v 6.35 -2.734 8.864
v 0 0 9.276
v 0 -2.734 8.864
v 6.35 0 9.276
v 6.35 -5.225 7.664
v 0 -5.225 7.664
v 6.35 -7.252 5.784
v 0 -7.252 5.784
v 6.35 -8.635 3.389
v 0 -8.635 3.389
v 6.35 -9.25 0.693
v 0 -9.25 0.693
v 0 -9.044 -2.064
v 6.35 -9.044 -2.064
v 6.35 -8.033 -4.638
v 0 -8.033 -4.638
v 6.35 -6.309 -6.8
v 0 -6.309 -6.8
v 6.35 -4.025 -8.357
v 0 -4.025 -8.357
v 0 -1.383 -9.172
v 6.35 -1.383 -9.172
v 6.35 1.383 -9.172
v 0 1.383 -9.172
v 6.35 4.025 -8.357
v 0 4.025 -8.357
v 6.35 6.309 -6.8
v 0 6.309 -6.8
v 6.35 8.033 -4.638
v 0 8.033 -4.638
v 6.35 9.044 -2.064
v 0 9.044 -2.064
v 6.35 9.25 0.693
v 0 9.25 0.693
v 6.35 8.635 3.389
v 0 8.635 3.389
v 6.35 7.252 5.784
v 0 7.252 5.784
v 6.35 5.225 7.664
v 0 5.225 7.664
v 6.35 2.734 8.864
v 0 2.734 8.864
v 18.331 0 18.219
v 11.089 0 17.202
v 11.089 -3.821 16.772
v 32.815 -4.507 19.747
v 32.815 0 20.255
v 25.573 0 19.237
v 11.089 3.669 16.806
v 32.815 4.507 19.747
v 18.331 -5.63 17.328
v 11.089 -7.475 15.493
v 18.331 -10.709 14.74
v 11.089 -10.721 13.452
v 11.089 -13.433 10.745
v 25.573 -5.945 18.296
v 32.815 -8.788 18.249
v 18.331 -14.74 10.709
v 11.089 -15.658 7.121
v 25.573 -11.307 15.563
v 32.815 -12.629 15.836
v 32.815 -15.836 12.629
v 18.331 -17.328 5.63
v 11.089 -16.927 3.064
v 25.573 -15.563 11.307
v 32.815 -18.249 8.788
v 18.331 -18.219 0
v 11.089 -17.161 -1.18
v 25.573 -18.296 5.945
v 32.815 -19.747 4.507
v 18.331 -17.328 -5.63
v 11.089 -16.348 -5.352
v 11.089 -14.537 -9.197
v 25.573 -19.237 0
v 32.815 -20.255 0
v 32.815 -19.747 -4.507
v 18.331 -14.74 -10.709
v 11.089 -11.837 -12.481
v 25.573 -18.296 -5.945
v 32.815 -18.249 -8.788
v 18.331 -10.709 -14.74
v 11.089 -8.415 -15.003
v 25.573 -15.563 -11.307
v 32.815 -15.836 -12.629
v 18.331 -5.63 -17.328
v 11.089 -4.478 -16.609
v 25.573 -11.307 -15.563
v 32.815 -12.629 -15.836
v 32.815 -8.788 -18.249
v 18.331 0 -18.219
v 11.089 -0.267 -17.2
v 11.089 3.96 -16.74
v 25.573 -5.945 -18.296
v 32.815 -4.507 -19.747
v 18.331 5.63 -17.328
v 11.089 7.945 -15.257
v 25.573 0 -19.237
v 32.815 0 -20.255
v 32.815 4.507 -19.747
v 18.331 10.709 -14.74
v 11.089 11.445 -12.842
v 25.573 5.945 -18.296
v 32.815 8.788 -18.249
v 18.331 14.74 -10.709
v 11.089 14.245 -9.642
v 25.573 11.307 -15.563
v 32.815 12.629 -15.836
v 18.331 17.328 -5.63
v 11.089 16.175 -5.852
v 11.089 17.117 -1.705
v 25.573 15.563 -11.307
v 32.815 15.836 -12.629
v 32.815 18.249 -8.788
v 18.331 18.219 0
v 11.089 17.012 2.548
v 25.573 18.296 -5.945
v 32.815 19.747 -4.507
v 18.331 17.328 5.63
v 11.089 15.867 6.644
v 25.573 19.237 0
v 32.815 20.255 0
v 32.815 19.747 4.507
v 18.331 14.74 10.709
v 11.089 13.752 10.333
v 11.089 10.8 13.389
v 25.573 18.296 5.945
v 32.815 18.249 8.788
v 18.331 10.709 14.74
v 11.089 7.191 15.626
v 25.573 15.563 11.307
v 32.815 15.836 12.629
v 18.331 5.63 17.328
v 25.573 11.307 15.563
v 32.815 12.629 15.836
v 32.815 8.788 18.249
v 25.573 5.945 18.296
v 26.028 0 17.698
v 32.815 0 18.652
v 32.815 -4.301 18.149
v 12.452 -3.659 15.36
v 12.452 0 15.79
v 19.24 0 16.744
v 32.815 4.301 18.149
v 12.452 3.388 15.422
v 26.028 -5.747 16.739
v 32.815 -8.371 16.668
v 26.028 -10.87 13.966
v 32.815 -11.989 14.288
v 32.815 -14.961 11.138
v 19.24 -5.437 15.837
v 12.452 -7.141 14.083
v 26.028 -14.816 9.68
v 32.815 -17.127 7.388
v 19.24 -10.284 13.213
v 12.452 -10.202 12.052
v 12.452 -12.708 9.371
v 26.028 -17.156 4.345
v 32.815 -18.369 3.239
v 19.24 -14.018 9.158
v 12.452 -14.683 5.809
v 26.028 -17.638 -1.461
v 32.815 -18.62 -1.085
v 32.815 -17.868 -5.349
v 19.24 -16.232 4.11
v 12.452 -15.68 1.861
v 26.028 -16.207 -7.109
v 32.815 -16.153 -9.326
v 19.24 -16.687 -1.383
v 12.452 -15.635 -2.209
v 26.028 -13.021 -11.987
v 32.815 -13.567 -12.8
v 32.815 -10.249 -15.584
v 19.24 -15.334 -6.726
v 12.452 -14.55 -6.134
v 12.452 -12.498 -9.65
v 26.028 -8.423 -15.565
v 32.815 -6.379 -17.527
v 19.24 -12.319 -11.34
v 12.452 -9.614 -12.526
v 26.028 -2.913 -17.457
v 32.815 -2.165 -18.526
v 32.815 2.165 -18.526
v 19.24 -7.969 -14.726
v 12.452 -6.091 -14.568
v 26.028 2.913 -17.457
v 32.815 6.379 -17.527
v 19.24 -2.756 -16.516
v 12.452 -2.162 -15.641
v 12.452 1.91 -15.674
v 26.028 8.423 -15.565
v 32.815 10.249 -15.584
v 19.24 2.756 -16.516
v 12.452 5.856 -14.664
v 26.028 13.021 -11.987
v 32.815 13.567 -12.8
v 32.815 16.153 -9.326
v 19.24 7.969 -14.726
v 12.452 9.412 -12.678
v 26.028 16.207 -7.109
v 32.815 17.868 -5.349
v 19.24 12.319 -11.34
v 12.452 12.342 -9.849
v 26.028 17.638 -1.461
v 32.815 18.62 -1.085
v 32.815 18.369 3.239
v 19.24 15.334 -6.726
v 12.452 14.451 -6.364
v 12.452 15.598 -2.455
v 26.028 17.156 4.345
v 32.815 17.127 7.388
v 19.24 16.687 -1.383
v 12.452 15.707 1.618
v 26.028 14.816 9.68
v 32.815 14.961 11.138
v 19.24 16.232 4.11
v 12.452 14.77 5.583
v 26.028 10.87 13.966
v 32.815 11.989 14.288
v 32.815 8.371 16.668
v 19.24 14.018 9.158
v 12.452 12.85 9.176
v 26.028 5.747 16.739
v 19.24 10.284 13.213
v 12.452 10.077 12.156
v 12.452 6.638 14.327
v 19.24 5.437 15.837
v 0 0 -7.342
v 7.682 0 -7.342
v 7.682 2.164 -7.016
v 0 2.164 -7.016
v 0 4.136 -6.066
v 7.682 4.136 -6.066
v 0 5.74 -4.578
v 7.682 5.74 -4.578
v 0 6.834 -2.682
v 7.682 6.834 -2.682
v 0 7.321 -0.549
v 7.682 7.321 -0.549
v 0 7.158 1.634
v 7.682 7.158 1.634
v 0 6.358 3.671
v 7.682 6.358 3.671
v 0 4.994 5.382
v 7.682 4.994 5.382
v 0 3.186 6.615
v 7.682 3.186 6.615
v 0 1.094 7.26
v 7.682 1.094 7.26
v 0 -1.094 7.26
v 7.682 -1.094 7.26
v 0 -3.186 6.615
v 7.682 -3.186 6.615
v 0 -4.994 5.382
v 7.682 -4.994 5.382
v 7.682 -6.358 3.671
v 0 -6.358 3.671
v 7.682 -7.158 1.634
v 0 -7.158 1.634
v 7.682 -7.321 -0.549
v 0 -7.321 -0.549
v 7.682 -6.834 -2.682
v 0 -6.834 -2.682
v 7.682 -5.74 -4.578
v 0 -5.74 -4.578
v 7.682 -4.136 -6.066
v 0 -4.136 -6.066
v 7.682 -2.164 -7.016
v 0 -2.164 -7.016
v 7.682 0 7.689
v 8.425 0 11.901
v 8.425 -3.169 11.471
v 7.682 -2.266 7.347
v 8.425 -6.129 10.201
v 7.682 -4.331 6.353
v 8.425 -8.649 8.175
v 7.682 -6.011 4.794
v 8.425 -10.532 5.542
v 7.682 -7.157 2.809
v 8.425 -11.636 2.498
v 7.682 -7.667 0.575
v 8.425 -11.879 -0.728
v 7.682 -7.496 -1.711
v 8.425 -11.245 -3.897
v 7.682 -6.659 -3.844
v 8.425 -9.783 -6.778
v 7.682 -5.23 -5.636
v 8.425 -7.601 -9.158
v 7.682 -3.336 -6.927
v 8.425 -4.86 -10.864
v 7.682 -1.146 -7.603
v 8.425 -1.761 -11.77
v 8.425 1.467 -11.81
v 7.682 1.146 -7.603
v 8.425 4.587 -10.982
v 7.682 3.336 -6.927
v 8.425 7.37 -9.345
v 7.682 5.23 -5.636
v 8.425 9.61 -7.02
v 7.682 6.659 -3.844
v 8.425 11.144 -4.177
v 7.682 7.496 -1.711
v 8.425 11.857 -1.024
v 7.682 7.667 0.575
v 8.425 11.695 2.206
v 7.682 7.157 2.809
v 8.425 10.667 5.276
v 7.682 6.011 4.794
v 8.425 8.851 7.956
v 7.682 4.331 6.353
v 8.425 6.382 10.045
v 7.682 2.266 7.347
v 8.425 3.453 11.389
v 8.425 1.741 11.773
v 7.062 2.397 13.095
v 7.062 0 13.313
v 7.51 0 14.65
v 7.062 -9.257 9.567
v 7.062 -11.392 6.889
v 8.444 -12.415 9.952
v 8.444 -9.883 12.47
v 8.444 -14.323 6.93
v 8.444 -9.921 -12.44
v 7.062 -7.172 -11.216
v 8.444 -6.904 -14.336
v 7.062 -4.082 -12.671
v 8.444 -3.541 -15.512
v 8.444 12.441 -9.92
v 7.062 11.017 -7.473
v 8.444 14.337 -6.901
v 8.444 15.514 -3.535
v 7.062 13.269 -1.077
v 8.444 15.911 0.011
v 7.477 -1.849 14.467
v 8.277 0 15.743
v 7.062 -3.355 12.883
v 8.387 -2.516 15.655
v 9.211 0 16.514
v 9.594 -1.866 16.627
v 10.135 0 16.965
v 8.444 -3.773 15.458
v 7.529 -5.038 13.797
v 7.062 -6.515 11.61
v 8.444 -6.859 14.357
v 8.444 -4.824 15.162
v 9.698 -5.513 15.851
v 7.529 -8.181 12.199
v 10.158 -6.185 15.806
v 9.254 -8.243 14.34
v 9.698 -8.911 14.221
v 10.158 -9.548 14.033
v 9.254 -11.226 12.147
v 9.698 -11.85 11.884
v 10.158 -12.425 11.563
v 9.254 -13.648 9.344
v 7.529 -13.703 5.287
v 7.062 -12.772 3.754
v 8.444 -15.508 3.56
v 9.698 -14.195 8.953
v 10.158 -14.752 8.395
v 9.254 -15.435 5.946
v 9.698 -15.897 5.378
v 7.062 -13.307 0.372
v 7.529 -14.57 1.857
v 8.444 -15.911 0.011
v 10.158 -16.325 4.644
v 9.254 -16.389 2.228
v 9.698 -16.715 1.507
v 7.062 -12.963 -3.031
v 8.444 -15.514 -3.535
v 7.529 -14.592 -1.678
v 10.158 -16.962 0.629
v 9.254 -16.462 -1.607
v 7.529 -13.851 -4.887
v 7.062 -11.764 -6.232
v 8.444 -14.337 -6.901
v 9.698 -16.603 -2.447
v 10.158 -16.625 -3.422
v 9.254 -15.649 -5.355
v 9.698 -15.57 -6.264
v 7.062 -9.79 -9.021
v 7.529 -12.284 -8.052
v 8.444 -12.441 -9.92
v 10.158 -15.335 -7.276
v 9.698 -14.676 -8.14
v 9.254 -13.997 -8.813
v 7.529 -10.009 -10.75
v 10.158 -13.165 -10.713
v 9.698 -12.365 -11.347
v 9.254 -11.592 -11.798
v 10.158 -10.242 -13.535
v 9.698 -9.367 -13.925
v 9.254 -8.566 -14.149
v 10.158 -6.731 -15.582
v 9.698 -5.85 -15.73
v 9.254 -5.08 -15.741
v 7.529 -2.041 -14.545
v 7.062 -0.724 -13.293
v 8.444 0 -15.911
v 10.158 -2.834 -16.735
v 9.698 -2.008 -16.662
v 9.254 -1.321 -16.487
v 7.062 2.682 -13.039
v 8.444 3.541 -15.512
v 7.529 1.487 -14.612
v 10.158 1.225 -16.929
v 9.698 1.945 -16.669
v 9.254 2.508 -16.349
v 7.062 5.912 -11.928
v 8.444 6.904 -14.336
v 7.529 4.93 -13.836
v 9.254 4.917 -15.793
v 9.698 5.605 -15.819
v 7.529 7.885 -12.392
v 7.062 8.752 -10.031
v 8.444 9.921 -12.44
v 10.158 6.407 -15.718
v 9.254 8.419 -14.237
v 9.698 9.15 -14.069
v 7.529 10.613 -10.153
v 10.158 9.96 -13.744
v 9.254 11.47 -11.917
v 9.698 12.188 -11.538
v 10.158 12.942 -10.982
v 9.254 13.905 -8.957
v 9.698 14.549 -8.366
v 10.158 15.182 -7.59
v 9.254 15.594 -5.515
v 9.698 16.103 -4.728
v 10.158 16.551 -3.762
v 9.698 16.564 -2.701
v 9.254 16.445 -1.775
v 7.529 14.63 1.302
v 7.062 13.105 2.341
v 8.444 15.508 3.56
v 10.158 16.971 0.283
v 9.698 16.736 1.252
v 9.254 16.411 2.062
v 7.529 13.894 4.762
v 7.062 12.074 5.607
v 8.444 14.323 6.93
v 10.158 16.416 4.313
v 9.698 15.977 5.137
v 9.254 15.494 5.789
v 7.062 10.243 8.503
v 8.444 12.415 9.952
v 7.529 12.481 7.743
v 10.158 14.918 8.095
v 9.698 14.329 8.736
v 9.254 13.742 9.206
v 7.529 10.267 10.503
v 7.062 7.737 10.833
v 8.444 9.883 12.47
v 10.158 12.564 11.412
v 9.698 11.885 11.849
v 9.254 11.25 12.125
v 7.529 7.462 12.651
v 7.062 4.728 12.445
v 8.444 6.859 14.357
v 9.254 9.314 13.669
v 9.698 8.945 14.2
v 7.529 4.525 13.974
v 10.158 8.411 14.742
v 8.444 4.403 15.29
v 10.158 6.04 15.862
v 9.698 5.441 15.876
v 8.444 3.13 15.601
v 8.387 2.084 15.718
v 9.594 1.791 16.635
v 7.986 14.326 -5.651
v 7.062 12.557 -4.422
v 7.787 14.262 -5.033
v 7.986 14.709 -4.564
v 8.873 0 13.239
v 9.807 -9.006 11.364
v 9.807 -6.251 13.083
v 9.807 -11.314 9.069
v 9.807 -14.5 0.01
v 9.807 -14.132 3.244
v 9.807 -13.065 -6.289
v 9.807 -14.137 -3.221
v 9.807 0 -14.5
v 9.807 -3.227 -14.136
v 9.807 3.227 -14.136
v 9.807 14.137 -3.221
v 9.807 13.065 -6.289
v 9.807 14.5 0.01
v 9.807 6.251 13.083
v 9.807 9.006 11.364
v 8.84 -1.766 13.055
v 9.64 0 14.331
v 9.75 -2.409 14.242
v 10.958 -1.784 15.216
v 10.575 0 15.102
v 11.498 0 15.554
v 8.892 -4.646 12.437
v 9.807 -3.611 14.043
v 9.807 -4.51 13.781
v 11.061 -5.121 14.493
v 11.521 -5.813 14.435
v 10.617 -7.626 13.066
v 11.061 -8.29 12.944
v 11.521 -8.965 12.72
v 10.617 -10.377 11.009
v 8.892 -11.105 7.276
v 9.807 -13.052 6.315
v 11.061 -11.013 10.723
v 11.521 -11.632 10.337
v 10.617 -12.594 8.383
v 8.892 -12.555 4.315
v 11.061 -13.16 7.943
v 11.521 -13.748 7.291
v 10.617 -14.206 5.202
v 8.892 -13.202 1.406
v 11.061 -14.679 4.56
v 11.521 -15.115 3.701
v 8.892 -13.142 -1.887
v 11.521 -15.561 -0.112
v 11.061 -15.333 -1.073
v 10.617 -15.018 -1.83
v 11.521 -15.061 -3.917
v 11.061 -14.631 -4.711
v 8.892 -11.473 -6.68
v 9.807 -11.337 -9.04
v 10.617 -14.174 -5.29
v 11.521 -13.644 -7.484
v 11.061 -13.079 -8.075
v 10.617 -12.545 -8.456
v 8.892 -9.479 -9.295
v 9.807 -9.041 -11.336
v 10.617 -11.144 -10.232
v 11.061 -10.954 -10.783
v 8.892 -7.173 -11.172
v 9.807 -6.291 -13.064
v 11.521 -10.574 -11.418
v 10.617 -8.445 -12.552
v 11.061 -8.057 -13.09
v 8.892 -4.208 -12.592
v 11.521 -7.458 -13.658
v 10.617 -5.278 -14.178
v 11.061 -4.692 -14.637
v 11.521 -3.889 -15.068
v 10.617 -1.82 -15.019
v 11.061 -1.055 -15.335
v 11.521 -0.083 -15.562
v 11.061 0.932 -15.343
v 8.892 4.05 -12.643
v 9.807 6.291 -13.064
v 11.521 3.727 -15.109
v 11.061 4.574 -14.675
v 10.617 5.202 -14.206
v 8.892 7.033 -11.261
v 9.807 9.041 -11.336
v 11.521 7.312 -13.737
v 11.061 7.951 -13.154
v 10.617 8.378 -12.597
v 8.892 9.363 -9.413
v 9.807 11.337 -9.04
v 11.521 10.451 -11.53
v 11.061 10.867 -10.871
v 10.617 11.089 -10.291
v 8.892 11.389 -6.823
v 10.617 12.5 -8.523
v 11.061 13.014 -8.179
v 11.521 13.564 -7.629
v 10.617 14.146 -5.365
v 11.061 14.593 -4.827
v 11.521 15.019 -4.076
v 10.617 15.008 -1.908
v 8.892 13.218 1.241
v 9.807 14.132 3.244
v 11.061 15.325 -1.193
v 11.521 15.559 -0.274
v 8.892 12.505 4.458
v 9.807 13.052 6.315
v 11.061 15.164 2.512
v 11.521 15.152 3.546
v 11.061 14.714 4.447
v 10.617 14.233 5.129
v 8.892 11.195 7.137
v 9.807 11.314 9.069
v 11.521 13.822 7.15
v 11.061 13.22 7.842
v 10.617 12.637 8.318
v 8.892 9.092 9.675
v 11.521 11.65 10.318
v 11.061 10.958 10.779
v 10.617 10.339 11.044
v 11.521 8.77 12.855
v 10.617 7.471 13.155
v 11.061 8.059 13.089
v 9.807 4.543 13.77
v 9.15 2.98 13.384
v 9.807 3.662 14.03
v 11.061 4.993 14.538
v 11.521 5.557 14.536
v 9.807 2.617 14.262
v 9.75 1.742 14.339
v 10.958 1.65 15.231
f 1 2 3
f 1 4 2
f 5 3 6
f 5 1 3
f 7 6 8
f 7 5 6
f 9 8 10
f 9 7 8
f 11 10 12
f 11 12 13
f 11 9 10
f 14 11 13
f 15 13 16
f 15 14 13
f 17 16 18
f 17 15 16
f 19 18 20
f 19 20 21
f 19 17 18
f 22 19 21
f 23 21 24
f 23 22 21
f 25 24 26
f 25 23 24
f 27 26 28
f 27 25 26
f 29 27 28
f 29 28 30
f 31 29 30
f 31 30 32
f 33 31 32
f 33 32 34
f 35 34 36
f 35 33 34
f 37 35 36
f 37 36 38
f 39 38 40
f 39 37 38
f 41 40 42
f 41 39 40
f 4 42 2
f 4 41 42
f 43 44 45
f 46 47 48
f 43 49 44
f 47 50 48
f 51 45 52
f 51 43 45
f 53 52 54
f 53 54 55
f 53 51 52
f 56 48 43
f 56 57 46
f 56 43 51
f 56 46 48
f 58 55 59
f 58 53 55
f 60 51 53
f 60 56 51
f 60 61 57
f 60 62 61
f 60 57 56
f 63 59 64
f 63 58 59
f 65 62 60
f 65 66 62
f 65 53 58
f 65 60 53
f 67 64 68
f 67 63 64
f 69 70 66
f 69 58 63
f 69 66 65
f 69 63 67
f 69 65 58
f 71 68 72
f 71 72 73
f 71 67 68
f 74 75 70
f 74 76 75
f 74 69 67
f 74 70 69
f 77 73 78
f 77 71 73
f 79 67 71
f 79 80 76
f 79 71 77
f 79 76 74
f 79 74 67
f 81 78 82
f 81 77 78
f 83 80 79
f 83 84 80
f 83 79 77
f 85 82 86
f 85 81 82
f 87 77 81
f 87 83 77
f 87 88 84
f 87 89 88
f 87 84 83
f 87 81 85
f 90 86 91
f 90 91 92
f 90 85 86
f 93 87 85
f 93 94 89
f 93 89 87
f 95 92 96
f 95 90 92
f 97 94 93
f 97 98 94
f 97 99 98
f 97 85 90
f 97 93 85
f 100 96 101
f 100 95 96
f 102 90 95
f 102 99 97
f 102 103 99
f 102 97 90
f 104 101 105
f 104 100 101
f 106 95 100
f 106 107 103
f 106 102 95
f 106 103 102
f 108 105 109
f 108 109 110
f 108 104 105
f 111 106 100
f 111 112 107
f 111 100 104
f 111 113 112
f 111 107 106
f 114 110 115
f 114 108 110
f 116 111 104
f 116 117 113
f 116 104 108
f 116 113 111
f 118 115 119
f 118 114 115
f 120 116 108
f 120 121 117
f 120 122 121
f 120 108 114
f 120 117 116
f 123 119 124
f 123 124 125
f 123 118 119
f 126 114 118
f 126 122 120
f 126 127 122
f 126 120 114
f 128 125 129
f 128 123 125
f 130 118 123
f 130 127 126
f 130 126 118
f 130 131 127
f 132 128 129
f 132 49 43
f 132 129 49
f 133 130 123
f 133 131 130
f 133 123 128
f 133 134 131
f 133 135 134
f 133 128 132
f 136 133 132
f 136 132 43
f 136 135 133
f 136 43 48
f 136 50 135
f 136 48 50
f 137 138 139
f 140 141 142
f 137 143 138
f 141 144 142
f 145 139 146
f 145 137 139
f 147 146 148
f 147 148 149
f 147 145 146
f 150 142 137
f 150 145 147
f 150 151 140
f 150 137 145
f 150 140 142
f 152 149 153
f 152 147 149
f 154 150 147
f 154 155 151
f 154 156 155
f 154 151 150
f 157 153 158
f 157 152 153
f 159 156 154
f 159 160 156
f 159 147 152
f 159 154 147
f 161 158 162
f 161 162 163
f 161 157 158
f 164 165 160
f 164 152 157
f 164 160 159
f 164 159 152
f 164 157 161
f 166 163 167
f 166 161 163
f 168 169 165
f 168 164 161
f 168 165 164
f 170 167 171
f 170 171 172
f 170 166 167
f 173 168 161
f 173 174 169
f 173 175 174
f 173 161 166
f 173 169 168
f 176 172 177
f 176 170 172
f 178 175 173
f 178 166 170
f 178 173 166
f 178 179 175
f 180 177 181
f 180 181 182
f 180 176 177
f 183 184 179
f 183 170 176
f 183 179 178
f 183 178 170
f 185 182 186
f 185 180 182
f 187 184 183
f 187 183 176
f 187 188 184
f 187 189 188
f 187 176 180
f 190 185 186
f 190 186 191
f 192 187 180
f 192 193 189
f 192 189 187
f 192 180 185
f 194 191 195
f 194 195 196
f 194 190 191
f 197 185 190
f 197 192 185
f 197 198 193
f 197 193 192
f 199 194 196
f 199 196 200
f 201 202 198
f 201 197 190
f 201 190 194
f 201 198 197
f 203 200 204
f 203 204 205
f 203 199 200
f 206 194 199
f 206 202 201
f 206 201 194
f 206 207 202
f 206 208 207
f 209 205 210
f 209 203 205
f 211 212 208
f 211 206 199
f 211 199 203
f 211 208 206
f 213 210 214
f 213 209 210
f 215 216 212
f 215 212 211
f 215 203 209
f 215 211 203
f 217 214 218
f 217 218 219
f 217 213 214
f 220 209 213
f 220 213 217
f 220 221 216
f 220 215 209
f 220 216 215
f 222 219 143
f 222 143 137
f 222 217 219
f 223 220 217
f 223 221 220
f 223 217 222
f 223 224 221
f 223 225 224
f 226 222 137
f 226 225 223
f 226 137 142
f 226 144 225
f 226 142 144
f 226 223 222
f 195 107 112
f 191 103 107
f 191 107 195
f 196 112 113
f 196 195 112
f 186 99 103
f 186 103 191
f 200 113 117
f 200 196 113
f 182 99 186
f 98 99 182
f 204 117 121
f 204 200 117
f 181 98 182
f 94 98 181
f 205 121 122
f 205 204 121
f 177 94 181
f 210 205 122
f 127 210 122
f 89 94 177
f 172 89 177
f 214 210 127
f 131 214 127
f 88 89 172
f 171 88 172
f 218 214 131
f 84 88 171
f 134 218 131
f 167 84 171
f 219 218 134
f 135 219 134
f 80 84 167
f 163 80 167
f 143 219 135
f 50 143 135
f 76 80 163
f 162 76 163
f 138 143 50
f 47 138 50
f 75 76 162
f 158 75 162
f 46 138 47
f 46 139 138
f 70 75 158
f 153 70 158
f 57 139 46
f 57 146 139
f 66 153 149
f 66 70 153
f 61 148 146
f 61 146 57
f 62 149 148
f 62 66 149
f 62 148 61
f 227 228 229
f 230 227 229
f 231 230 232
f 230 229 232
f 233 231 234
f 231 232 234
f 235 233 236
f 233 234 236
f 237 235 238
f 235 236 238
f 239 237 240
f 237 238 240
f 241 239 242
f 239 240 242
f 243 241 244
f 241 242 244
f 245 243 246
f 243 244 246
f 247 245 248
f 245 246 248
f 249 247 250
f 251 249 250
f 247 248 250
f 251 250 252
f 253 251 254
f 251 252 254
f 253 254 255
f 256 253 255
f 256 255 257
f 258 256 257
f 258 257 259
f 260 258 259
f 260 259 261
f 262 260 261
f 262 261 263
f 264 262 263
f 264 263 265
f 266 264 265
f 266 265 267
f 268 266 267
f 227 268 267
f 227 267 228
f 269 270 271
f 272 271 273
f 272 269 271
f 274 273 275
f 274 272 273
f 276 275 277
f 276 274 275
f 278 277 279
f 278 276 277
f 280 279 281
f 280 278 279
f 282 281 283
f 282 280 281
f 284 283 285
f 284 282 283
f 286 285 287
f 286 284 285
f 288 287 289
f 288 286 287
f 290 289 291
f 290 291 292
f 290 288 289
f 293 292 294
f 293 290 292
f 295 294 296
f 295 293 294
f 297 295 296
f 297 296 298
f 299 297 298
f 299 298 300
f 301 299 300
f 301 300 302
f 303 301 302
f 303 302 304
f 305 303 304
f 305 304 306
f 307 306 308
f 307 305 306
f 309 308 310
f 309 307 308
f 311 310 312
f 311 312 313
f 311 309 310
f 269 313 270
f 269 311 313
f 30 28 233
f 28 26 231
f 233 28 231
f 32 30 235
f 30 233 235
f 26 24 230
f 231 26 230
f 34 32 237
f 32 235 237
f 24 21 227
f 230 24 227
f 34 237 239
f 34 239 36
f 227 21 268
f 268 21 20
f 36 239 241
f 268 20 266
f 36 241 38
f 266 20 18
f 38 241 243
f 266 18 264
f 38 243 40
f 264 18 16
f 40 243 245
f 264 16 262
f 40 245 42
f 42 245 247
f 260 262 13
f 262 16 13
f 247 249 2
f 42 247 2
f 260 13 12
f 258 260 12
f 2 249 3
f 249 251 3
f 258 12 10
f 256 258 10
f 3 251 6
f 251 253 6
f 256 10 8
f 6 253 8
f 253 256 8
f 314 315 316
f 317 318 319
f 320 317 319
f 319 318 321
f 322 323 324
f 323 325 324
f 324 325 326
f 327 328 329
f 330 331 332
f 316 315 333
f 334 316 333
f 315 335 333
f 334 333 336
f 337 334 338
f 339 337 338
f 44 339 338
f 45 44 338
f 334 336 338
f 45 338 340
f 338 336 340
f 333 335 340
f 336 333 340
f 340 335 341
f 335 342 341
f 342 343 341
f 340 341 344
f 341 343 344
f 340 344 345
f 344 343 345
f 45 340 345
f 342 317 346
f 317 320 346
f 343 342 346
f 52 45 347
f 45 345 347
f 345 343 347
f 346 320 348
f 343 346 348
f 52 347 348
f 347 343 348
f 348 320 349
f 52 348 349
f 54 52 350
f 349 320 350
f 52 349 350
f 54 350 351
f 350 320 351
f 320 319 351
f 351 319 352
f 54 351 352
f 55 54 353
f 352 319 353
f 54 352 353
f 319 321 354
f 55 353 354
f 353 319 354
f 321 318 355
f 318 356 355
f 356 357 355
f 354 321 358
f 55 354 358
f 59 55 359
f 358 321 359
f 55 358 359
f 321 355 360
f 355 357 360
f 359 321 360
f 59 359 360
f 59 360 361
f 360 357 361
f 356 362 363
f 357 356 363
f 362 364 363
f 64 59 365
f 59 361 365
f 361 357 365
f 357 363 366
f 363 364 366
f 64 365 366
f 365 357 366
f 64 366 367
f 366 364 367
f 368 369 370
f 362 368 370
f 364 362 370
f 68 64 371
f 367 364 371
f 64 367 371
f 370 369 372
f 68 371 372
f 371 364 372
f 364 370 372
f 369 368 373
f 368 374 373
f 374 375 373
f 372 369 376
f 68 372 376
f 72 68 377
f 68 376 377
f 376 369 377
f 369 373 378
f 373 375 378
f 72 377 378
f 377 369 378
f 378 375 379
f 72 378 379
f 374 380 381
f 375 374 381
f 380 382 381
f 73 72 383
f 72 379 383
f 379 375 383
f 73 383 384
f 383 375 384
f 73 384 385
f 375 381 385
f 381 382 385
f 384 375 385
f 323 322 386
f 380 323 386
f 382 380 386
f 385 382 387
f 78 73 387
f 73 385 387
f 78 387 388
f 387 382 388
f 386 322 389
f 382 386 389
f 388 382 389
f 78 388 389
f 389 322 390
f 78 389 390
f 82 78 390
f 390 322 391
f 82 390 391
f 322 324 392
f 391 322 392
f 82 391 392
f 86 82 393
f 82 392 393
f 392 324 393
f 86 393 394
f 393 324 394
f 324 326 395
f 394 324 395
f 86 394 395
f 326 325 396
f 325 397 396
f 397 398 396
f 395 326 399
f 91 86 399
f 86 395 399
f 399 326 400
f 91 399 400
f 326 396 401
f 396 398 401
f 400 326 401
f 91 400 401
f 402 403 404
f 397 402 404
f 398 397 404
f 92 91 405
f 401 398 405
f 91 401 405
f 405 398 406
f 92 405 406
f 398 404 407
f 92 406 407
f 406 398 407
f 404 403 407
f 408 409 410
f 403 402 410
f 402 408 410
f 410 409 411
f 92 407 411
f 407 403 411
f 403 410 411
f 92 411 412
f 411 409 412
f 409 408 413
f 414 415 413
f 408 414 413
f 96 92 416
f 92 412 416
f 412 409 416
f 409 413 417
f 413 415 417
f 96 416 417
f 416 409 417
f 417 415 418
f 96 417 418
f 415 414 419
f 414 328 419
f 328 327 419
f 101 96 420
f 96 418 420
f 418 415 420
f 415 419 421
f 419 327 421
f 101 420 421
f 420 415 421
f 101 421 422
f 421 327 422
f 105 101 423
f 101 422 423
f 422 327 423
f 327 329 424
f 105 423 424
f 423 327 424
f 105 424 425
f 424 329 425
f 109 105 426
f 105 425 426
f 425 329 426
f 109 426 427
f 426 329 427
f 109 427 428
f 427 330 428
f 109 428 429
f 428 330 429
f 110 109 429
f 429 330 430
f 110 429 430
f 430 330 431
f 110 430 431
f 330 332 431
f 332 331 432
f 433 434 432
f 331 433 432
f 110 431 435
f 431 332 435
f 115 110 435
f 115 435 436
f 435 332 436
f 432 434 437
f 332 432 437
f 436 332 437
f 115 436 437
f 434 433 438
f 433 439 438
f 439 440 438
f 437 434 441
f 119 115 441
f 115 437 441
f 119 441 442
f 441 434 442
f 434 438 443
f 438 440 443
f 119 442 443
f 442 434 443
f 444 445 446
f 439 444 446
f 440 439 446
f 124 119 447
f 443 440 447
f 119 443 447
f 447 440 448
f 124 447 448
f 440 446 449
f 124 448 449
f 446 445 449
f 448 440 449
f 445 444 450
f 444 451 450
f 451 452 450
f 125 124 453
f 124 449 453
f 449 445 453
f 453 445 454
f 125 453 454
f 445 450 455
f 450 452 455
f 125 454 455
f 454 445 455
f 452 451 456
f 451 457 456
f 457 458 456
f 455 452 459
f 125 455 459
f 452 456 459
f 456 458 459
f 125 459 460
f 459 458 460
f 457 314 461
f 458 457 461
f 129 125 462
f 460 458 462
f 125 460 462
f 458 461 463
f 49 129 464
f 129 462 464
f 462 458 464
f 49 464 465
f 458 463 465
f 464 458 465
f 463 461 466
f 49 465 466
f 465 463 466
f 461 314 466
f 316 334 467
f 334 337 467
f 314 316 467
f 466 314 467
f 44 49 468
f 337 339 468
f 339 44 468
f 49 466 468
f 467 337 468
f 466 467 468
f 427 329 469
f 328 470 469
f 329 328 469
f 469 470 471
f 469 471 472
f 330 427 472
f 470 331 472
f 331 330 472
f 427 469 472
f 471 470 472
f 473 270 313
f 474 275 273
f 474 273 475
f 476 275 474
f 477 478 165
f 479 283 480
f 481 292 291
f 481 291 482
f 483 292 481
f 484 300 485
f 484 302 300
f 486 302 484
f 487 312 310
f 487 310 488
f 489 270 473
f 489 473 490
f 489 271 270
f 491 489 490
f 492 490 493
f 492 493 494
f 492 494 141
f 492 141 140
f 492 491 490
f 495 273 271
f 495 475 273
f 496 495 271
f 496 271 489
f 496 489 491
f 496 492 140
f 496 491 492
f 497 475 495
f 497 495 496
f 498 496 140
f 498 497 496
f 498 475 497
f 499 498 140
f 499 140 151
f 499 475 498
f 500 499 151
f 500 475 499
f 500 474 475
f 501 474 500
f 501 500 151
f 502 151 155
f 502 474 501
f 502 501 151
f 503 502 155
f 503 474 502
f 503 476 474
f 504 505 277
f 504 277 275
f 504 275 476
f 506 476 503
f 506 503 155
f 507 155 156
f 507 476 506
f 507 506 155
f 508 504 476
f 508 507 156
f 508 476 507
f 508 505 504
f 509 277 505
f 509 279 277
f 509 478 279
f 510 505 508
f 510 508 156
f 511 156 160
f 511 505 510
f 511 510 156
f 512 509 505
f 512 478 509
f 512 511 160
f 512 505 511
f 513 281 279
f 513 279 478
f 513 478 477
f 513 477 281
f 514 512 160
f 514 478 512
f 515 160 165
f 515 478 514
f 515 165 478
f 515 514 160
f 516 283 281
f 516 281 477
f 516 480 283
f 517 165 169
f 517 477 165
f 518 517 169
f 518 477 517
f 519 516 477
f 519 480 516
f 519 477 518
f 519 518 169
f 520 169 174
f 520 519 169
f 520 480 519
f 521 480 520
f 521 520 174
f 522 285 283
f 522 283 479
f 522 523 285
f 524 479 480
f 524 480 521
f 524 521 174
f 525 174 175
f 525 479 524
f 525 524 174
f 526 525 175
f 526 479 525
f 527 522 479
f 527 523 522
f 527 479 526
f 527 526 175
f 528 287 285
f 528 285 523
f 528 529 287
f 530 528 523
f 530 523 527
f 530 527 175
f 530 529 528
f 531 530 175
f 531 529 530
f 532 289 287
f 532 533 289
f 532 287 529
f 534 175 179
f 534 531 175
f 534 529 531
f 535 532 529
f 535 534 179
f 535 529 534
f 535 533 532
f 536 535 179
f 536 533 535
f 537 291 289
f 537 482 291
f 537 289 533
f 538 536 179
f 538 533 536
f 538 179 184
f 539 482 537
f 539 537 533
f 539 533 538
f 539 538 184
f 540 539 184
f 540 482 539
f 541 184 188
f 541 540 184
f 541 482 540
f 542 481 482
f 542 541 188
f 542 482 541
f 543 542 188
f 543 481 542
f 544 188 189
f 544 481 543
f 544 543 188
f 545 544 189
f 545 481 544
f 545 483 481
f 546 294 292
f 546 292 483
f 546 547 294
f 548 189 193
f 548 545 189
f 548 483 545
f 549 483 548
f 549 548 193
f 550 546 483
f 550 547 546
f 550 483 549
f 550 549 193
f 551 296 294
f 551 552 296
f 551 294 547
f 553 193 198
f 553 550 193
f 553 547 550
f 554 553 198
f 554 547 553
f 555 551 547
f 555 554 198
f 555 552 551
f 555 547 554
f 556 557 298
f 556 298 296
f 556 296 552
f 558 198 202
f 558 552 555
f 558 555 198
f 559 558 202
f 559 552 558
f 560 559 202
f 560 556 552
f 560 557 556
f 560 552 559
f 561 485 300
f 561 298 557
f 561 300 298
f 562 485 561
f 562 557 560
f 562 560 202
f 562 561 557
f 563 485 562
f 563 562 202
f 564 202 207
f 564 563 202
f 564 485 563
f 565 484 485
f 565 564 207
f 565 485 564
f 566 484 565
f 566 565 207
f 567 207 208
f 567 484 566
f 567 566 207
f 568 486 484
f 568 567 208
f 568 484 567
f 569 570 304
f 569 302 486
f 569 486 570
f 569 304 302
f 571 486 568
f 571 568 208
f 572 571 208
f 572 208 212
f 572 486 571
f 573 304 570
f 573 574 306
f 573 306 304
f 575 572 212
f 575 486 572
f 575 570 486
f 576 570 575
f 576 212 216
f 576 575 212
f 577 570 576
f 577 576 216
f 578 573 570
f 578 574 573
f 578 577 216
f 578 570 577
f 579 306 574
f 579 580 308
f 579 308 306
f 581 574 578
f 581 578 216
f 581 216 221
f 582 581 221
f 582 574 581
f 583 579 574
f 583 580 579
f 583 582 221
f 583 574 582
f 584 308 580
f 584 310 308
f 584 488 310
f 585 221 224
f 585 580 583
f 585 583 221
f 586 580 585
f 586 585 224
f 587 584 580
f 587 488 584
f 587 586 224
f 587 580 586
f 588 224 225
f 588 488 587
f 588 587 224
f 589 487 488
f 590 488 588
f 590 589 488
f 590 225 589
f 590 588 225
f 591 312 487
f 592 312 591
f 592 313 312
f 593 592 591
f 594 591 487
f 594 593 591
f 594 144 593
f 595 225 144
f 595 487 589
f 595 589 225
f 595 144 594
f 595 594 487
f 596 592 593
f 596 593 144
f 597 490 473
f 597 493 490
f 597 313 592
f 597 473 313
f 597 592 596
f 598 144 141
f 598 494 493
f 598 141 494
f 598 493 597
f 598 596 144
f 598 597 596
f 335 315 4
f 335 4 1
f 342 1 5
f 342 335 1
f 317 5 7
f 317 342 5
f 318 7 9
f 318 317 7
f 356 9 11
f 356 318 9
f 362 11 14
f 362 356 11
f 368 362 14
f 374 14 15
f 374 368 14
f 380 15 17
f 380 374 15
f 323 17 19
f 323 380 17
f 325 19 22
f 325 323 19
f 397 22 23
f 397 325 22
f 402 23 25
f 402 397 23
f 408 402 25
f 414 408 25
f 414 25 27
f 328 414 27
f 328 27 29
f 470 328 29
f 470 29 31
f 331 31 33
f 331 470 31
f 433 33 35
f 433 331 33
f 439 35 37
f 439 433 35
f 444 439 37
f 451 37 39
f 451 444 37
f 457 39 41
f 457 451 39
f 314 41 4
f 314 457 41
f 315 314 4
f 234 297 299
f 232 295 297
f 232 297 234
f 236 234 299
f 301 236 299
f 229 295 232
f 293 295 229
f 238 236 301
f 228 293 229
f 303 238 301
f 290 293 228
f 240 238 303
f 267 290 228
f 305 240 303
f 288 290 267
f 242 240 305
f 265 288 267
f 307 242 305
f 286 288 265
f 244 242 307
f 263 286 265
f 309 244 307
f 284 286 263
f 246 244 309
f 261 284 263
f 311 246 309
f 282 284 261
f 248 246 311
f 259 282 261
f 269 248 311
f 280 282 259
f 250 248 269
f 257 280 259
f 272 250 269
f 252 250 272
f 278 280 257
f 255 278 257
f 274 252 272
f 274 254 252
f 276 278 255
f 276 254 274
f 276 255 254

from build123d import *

# Parameters (mm, degrees)
TAPPED_HOLE_FOR_9_16_12_HELICOIL1_D     = 14.68374
TAPPED_HOLE_FOR_9_16_12_HELICOIL1_DEPTH = 26.924
TAPPED_HOLE_FOR_9_16_12_HELICOIL1_TIP   = 4.411440553
FILLET1_R                               = 4.7625


with BuildPart() as part:
    # Sketch1 → Revolve1 (revolve)
    with BuildSketch(Plane.XY, mode=Mode.PRIVATE) as revolve1_sk:
        Polygon((0, 9.27608), (6.35, 9.27608), (7.662583372, 16.720110216), (32.815392318, 20.255106981), (32.815392318, 18.652005709), (9.025682257, 15.30858), (7.682070664, 7.68858), (7.682070664, 0), (0, 0), (0, 7.68858), align=None)
    revolve(revolve1_sk.sketch.rotate(Axis((0, 0, 0), (1, 0, 0)), 90), axis=Axis((0, 0, 0), (1, 0, 0)))

    # Tapped Hole for 9/16-12 Helicoil1
    with Locations(Plane.ZY):
        with Locations((0, 0)):
            Hole(TAPPED_HOLE_FOR_9_16_12_HELICOIL1_D / 2, depth=TAPPED_HOLE_FOR_9_16_12_HELICOIL1_DEPTH)
            with Locations((0, 0, -(TAPPED_HOLE_FOR_9_16_12_HELICOIL1_DEPTH + TAPPED_HOLE_FOR_9_16_12_HELICOIL1_TIP / 2))):  # 118° drill point
                Cone(0, TAPPED_HOLE_FOR_9_16_12_HELICOIL1_D / 2, TAPPED_HOLE_FOR_9_16_12_HELICOIL1_TIP, mode=Mode.SUBTRACT)

    # Fillet1
    fillet1_edges = [part.edges().sort_by_distance(p)[0] for p in [
        (9.025682257, 0, -15.30858),
        (7.662583372, 0, -16.720110216),
    ]]
    fillet(fillet1_edges, radius=FILLET1_R)


solid = part.part
